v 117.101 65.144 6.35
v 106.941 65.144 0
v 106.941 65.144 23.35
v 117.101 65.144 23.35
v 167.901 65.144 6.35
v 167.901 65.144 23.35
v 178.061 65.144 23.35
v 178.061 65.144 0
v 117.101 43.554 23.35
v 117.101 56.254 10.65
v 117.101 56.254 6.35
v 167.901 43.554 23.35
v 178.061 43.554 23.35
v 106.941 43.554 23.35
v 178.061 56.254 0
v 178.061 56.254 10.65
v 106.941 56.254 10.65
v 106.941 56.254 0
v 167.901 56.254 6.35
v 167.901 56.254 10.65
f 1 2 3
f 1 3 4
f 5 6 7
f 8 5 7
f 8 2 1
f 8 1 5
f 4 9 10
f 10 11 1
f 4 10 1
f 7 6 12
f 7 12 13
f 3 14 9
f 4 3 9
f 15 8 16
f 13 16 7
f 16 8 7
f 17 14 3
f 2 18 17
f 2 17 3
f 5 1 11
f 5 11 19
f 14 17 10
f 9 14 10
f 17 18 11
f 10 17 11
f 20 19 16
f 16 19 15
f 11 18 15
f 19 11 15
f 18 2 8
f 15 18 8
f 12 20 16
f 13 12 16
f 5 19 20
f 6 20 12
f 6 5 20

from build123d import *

# Parameters (mm, degrees)
SKETCH1_W           = 71.12
SKETCH1_H           = 8.89
BOSS_EXTRUDE1_DEPTH = 6.35
SKETCH5_W           = 10.16
SKETCH5_H           = 8.89
BOSS_EXTRUDE5_DEPTH = 17
SKETCH6_W           = 10.16
SKETCH6_H           = 12.7
BOSS_EXTRUDE6_DEPTH = 12.7
CHAMFER3_SIZE       = 12.7


with BuildPart() as part:
    # Sketch1 → Boss-Extrude1 (new body)
    with BuildSketch(Plane.XY):
        with Locations((142.501032585, 60.698661386)):
            Rectangle(SKETCH1_W, SKETCH1_H)
    extrude(amount=BOSS_EXTRUDE1_DEPTH)

    # Sketch5 → Boss-Extrude5 (add)
    with BuildSketch(Plane.XY.offset(6.35)):
        with Locations((112.021032585, 60.698661386)):
            Rectangle(SKETCH5_W, SKETCH5_H)
        with Locations((172.981032585, 60.698661386)):
            Rectangle(SKETCH5_W, SKETCH5_H)
    extrude(amount=BOSS_EXTRUDE5_DEPTH)

    # Sketch6 → Boss-Extrude6 (add)
    with BuildSketch(Plane.XZ.offset(-56.253661386)):
        with Locations((172.981032585, 17)):
            Rectangle(SKETCH6_W, SKETCH6_H)
        with Locations((112.021032585, 17)):
            Rectangle(SKETCH6_W, SKETCH6_H)
    extrude(amount=BOSS_EXTRUDE6_DEPTH)

    # Chamfer3
    chamfer3_edges = [part.edges().sort_by_distance(p)[0] for p in [
        (112.021032585, 43.553661386, 10.65),
        (172.981032585, 43.553661386, 10.65),
    ]]
    chamfer(chamfer3_edges, length=CHAMFER3_SIZE - 0.0001)  # a hair under: the kernel refuses the full size


solid = part.part
